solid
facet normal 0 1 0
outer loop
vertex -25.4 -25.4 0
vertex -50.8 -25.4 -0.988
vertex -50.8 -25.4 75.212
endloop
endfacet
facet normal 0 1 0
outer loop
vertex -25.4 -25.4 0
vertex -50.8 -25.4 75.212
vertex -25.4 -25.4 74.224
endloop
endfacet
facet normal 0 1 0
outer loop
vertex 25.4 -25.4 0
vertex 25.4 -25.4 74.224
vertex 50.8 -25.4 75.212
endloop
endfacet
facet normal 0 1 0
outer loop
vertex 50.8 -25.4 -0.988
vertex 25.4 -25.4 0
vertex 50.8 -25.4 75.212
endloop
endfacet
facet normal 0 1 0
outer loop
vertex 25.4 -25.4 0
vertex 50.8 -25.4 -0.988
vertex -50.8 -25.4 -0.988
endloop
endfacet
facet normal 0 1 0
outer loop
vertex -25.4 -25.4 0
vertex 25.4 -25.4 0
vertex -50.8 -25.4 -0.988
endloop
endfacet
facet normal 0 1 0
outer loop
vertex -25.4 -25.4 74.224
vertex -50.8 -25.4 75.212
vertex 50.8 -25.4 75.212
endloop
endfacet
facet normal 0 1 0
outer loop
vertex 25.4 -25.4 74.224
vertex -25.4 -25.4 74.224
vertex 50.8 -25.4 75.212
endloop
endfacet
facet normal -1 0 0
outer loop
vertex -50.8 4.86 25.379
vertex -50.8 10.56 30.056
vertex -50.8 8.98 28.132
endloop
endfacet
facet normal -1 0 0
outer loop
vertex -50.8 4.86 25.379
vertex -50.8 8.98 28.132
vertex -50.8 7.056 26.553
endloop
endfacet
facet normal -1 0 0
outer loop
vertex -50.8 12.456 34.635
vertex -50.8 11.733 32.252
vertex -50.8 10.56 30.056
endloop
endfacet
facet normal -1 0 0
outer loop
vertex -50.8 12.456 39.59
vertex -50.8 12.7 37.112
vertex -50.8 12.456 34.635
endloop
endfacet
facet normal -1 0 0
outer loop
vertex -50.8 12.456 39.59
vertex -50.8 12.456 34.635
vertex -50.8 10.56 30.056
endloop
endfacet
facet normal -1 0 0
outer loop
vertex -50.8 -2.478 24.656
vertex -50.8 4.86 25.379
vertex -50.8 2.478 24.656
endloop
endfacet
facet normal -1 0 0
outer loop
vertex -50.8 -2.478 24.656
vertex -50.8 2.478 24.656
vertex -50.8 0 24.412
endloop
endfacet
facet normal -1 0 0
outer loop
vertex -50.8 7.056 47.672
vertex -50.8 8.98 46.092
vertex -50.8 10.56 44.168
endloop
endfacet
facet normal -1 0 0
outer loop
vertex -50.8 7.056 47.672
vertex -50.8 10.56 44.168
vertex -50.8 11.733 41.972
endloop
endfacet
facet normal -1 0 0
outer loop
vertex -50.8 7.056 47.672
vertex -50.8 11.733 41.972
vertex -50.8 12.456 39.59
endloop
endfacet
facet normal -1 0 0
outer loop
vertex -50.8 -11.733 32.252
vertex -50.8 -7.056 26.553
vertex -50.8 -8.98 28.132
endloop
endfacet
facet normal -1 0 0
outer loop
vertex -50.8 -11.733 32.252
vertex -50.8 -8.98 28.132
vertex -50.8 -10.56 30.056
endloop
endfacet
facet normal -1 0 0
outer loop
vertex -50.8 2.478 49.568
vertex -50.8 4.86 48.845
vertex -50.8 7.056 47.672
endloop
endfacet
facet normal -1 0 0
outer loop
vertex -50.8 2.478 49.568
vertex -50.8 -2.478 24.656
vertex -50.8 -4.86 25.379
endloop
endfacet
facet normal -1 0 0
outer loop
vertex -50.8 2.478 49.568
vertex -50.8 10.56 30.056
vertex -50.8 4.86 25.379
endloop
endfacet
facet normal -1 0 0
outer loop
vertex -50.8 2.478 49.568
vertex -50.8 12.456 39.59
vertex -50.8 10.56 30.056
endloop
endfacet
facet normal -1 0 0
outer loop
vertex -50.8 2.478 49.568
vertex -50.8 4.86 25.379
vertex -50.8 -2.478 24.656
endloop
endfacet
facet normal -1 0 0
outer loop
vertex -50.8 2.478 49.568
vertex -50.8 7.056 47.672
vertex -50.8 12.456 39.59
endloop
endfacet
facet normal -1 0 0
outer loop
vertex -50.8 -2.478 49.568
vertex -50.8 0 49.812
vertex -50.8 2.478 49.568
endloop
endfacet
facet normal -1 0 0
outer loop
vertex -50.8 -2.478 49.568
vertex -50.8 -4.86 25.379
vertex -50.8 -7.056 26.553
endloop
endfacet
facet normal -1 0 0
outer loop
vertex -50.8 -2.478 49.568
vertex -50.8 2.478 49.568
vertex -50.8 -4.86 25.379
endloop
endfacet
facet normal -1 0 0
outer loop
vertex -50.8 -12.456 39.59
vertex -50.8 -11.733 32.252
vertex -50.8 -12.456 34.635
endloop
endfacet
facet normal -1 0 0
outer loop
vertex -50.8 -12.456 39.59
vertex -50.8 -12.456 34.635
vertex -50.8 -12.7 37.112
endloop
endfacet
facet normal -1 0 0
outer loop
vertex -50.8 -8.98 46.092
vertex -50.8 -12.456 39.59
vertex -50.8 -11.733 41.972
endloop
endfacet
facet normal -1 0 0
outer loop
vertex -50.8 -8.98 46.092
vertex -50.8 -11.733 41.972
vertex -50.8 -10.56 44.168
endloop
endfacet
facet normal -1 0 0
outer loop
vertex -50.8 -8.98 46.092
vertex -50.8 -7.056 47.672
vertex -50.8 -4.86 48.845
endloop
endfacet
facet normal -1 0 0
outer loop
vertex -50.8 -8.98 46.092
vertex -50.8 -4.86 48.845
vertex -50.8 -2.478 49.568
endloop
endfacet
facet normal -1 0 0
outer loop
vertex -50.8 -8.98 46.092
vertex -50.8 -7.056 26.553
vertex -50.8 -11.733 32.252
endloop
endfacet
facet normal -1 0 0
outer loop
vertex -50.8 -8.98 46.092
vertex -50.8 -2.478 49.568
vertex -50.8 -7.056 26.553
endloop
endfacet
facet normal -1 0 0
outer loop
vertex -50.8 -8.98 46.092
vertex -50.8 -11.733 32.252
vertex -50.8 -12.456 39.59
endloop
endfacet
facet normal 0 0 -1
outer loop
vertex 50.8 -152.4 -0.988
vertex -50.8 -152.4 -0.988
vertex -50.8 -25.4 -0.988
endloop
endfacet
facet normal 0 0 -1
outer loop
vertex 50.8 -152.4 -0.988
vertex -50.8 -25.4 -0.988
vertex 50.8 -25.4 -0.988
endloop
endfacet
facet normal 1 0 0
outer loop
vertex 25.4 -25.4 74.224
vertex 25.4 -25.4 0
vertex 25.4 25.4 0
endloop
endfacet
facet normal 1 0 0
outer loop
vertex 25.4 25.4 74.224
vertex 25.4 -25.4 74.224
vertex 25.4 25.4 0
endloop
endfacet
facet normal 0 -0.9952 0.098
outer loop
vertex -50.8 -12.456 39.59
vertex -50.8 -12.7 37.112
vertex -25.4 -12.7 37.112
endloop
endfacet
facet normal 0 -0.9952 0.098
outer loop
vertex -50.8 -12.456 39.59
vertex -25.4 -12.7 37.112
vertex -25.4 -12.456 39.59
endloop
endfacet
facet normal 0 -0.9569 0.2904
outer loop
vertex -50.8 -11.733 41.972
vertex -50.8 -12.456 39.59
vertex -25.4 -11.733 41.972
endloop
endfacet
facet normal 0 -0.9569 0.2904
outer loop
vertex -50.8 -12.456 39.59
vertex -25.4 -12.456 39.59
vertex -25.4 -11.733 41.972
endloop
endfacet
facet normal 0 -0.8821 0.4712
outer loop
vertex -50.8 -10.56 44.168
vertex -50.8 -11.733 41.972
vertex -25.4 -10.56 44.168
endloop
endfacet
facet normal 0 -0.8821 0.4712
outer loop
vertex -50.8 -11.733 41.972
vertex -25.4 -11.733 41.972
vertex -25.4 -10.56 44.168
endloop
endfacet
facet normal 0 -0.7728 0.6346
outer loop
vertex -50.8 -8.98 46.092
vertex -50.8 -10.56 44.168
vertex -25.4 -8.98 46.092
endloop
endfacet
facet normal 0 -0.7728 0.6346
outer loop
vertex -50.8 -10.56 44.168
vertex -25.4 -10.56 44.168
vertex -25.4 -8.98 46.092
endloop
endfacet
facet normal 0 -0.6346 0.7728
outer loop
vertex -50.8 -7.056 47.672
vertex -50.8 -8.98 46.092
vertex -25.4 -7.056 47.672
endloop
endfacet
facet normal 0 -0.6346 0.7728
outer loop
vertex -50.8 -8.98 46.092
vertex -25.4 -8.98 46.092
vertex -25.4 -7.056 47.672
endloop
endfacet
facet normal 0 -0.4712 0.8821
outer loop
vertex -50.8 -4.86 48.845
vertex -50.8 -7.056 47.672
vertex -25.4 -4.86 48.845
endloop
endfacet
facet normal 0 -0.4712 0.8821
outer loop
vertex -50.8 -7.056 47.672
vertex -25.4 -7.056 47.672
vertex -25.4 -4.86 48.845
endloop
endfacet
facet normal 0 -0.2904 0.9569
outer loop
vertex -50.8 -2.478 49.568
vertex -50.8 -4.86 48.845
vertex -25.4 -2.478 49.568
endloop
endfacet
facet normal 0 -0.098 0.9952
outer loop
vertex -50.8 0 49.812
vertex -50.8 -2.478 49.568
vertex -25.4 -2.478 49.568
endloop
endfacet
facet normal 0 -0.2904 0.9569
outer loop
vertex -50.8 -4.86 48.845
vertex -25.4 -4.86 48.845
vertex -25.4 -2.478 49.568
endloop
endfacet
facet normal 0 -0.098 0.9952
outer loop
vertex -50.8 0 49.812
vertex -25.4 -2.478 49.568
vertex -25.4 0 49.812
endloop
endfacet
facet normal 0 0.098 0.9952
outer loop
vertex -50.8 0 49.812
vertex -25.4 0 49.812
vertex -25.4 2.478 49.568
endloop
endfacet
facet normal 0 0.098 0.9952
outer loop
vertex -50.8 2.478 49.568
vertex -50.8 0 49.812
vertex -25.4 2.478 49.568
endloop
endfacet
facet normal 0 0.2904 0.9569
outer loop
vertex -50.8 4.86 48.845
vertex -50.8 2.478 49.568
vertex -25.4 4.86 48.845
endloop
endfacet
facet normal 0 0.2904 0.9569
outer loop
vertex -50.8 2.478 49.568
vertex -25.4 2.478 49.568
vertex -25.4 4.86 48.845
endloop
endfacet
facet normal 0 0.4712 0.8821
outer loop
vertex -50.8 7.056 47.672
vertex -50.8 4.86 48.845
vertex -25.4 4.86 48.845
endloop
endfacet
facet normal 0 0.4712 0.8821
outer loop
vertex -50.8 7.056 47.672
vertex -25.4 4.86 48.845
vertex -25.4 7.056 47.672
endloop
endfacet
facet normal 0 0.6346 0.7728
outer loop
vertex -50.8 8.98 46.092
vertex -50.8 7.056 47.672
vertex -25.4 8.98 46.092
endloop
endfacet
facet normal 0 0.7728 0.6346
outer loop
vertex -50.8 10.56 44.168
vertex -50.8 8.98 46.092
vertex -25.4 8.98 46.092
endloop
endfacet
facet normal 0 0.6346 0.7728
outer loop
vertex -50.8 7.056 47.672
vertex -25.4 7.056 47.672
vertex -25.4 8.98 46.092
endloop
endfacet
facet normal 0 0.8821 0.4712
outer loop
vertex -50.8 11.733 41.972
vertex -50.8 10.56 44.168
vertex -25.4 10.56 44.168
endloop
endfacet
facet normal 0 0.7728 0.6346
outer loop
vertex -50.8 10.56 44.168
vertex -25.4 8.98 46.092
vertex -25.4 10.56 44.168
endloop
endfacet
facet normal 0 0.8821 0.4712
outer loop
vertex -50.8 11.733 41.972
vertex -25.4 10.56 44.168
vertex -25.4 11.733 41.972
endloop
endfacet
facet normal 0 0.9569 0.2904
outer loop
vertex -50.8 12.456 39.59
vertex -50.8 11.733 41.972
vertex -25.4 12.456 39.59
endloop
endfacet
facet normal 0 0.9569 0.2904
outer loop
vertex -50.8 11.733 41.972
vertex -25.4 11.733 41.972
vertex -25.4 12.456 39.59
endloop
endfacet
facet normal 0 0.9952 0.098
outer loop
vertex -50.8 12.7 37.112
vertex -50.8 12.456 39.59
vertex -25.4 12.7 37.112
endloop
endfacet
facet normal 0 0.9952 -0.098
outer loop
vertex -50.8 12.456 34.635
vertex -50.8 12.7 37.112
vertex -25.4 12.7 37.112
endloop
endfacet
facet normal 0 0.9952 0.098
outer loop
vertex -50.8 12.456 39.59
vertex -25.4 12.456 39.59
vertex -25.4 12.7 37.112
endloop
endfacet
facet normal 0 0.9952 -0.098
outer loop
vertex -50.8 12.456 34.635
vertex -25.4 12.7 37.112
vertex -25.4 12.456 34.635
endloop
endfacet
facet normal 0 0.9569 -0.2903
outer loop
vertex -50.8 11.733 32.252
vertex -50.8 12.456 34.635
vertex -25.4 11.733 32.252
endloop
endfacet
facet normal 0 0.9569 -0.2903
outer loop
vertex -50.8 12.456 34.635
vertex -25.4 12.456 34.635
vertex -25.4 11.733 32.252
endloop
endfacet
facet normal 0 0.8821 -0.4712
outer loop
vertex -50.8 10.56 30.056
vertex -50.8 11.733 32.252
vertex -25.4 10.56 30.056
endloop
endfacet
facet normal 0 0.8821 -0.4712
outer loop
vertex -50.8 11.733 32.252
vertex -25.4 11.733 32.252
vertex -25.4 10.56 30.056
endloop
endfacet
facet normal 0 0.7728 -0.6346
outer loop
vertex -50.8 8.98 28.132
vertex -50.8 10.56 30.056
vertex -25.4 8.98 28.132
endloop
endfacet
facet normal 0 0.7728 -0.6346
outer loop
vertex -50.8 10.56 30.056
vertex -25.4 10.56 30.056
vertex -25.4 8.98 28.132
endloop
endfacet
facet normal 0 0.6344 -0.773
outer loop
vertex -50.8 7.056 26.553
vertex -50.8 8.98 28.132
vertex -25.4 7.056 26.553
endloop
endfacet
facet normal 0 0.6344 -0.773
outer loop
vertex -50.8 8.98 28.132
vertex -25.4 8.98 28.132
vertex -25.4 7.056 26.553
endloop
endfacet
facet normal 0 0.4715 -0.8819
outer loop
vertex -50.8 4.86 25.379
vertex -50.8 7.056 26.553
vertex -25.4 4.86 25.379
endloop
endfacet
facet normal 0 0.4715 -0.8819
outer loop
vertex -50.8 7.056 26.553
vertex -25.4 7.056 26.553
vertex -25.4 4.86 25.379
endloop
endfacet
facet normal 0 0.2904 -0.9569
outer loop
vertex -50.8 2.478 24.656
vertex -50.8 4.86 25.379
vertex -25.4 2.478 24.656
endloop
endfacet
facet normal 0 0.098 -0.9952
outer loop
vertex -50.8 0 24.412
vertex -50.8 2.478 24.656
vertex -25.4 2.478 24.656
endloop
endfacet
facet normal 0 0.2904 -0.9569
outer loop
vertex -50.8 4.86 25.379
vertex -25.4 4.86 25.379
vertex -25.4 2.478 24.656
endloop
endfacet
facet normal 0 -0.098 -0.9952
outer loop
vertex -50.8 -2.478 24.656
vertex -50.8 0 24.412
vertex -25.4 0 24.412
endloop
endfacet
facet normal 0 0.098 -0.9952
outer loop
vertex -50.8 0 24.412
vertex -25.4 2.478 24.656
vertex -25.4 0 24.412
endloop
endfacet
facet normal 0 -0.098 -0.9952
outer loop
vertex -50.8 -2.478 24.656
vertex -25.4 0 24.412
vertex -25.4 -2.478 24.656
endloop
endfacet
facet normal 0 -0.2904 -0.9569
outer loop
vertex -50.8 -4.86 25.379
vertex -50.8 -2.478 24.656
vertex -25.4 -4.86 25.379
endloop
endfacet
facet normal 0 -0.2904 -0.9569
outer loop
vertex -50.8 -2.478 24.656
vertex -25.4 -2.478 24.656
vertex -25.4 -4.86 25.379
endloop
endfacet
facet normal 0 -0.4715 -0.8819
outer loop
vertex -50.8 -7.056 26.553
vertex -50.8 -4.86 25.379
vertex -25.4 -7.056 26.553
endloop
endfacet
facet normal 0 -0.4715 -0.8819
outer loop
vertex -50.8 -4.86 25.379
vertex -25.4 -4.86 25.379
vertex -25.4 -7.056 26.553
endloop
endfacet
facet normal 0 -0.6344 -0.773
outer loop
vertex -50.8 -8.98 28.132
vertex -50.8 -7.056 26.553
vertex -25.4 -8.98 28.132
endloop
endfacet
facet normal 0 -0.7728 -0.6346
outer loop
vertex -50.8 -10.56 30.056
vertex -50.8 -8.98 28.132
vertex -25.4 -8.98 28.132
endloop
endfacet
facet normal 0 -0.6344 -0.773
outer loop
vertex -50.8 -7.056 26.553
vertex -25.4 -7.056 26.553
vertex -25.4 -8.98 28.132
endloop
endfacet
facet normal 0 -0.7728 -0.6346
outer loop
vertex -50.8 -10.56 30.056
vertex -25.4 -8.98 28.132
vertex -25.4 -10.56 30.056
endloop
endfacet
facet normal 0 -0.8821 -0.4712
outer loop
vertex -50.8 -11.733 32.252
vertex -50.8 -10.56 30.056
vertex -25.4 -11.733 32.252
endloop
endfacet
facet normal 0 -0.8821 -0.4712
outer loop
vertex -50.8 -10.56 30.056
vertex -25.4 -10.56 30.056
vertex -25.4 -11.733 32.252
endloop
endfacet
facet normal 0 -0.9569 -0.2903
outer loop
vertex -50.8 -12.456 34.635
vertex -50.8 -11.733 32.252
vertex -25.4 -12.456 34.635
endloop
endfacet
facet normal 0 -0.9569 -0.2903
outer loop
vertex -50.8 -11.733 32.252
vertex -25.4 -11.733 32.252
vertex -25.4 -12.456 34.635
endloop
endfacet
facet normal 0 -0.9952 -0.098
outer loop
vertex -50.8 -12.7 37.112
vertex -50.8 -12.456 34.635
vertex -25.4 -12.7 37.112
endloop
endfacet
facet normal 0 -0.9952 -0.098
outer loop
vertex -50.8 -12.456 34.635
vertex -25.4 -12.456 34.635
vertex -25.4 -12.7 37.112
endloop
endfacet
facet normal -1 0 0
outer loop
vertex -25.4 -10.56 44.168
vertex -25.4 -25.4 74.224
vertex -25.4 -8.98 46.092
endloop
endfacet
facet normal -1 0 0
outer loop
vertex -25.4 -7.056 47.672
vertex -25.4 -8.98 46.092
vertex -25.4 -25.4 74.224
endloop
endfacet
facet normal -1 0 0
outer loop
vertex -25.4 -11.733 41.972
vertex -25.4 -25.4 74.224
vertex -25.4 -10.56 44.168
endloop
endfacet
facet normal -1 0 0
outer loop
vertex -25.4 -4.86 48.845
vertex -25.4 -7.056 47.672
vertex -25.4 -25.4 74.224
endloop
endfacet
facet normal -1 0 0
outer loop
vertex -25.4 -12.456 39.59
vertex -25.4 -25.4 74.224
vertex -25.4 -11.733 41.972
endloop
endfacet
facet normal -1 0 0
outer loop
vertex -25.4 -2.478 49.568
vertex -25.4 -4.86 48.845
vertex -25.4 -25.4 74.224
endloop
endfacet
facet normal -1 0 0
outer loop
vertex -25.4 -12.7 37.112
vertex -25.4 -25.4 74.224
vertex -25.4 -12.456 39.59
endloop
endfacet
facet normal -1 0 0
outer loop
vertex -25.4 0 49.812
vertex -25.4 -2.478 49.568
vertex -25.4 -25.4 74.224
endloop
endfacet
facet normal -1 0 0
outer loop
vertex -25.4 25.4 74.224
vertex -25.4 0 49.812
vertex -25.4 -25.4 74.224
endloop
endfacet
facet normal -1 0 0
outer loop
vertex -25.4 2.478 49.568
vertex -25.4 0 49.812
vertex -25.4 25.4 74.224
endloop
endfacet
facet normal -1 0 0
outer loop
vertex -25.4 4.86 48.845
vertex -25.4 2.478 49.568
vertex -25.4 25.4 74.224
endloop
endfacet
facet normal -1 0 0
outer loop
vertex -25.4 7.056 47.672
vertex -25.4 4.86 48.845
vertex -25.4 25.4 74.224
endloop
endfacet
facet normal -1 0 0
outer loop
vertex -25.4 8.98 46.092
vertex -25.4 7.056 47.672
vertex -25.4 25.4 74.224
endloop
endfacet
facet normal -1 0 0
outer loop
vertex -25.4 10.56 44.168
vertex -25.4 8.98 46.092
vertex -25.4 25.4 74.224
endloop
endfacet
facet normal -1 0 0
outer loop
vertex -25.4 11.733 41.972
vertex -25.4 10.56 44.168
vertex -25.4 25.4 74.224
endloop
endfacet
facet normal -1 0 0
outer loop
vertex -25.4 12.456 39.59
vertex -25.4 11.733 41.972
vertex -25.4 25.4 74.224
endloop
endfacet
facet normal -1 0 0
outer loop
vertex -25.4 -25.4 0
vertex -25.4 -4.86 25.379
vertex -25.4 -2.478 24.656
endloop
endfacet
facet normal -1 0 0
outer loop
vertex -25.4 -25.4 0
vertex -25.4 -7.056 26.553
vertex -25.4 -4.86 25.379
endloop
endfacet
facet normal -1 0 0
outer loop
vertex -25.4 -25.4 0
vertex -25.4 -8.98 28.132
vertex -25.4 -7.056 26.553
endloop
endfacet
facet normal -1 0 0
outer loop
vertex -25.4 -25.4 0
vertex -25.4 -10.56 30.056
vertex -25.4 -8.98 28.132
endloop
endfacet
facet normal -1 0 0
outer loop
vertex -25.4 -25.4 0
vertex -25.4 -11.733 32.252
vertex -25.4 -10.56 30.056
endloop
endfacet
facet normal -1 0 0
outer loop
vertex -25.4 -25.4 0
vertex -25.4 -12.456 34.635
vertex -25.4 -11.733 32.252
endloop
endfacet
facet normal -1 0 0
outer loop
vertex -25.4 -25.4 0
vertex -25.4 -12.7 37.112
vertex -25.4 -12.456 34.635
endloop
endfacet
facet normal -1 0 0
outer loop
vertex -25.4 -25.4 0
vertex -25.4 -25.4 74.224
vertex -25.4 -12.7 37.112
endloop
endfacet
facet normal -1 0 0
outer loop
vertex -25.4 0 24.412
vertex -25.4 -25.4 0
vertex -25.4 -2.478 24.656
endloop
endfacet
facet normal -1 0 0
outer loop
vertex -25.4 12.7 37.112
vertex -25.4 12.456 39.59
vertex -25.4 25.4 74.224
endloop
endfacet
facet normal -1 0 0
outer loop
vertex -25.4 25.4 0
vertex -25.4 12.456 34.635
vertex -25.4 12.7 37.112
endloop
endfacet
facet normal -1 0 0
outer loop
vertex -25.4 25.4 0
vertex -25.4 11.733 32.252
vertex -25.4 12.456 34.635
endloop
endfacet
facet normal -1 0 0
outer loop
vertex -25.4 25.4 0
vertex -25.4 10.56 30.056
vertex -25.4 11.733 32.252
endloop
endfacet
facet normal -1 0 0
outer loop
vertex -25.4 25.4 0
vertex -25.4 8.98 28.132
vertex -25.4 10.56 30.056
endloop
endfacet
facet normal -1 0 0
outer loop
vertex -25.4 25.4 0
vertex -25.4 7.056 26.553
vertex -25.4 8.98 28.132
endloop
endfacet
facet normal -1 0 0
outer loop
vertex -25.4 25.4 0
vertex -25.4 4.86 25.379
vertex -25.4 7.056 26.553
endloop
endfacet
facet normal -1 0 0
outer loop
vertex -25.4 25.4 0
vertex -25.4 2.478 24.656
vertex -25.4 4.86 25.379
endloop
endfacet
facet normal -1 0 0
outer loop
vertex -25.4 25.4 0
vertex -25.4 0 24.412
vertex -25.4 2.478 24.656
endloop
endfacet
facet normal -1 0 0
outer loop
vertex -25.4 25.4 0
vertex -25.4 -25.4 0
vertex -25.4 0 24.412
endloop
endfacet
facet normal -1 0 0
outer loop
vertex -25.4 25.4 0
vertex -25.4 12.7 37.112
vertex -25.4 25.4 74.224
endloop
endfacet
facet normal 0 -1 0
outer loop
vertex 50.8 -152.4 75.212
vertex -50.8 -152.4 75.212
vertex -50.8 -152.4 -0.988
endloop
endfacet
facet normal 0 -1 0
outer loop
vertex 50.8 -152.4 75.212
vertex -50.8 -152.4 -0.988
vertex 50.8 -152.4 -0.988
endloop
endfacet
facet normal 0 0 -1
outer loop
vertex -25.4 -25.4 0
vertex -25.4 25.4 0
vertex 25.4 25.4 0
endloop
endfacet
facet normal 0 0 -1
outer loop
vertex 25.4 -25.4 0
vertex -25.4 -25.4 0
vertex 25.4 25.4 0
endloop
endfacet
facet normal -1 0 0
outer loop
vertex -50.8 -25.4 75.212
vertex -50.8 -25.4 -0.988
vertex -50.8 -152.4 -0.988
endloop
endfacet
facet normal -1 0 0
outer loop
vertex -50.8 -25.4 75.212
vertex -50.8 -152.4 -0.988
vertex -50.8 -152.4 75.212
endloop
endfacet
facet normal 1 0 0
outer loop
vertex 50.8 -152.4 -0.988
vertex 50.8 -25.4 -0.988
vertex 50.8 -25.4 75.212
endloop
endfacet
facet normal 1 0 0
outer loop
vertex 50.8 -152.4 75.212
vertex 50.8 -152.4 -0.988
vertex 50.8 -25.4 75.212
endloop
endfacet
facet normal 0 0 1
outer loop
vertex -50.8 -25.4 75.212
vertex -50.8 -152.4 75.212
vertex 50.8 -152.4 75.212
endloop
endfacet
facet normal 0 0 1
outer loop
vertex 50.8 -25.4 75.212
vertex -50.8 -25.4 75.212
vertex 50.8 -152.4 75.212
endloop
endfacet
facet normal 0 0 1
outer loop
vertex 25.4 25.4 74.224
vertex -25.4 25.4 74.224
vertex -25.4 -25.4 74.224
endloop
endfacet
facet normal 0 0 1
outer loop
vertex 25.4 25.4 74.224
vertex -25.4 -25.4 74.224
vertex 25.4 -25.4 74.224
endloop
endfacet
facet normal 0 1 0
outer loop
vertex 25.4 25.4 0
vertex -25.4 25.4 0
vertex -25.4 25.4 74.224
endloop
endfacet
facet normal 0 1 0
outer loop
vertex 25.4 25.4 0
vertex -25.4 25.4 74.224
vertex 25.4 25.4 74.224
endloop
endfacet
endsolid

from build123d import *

# Parameters (mm, degrees)
F0_W     = 50.8
F0_H     = 50.8
F1_DEPTH = 74.224433
F2_R     = 12.7
F3_DEPTH = 25.4
F4_W     = 101.6
F4_H     = 76.2
F5_DEPTH = 127


with BuildPart() as f1:
    # F0 (on Top) → F1 (new body)
    with BuildSketch(Plane.XY):
        Rectangle(F0_W, F0_H)
    extrude(amount=F1_DEPTH)

    # F2 (on face) → F3 (join)
    with BuildSketch(Plane(origin=(-25.4, 0, 0), x_dir=(0, -1, 0), z_dir=(-1, 0, 0))):
        with Locations((0, 37.112216)):
            Circle(F2_R)
    extrude(amount=F3_DEPTH)

    # F4 (on face) → F5 (join)
    with BuildSketch(Plane.XZ.offset(25.4)):
        with Locations((0, 37.112216)):
            Rectangle(F4_W, F4_H)
    extrude(amount=F5_DEPTH)


solid = f1.part
